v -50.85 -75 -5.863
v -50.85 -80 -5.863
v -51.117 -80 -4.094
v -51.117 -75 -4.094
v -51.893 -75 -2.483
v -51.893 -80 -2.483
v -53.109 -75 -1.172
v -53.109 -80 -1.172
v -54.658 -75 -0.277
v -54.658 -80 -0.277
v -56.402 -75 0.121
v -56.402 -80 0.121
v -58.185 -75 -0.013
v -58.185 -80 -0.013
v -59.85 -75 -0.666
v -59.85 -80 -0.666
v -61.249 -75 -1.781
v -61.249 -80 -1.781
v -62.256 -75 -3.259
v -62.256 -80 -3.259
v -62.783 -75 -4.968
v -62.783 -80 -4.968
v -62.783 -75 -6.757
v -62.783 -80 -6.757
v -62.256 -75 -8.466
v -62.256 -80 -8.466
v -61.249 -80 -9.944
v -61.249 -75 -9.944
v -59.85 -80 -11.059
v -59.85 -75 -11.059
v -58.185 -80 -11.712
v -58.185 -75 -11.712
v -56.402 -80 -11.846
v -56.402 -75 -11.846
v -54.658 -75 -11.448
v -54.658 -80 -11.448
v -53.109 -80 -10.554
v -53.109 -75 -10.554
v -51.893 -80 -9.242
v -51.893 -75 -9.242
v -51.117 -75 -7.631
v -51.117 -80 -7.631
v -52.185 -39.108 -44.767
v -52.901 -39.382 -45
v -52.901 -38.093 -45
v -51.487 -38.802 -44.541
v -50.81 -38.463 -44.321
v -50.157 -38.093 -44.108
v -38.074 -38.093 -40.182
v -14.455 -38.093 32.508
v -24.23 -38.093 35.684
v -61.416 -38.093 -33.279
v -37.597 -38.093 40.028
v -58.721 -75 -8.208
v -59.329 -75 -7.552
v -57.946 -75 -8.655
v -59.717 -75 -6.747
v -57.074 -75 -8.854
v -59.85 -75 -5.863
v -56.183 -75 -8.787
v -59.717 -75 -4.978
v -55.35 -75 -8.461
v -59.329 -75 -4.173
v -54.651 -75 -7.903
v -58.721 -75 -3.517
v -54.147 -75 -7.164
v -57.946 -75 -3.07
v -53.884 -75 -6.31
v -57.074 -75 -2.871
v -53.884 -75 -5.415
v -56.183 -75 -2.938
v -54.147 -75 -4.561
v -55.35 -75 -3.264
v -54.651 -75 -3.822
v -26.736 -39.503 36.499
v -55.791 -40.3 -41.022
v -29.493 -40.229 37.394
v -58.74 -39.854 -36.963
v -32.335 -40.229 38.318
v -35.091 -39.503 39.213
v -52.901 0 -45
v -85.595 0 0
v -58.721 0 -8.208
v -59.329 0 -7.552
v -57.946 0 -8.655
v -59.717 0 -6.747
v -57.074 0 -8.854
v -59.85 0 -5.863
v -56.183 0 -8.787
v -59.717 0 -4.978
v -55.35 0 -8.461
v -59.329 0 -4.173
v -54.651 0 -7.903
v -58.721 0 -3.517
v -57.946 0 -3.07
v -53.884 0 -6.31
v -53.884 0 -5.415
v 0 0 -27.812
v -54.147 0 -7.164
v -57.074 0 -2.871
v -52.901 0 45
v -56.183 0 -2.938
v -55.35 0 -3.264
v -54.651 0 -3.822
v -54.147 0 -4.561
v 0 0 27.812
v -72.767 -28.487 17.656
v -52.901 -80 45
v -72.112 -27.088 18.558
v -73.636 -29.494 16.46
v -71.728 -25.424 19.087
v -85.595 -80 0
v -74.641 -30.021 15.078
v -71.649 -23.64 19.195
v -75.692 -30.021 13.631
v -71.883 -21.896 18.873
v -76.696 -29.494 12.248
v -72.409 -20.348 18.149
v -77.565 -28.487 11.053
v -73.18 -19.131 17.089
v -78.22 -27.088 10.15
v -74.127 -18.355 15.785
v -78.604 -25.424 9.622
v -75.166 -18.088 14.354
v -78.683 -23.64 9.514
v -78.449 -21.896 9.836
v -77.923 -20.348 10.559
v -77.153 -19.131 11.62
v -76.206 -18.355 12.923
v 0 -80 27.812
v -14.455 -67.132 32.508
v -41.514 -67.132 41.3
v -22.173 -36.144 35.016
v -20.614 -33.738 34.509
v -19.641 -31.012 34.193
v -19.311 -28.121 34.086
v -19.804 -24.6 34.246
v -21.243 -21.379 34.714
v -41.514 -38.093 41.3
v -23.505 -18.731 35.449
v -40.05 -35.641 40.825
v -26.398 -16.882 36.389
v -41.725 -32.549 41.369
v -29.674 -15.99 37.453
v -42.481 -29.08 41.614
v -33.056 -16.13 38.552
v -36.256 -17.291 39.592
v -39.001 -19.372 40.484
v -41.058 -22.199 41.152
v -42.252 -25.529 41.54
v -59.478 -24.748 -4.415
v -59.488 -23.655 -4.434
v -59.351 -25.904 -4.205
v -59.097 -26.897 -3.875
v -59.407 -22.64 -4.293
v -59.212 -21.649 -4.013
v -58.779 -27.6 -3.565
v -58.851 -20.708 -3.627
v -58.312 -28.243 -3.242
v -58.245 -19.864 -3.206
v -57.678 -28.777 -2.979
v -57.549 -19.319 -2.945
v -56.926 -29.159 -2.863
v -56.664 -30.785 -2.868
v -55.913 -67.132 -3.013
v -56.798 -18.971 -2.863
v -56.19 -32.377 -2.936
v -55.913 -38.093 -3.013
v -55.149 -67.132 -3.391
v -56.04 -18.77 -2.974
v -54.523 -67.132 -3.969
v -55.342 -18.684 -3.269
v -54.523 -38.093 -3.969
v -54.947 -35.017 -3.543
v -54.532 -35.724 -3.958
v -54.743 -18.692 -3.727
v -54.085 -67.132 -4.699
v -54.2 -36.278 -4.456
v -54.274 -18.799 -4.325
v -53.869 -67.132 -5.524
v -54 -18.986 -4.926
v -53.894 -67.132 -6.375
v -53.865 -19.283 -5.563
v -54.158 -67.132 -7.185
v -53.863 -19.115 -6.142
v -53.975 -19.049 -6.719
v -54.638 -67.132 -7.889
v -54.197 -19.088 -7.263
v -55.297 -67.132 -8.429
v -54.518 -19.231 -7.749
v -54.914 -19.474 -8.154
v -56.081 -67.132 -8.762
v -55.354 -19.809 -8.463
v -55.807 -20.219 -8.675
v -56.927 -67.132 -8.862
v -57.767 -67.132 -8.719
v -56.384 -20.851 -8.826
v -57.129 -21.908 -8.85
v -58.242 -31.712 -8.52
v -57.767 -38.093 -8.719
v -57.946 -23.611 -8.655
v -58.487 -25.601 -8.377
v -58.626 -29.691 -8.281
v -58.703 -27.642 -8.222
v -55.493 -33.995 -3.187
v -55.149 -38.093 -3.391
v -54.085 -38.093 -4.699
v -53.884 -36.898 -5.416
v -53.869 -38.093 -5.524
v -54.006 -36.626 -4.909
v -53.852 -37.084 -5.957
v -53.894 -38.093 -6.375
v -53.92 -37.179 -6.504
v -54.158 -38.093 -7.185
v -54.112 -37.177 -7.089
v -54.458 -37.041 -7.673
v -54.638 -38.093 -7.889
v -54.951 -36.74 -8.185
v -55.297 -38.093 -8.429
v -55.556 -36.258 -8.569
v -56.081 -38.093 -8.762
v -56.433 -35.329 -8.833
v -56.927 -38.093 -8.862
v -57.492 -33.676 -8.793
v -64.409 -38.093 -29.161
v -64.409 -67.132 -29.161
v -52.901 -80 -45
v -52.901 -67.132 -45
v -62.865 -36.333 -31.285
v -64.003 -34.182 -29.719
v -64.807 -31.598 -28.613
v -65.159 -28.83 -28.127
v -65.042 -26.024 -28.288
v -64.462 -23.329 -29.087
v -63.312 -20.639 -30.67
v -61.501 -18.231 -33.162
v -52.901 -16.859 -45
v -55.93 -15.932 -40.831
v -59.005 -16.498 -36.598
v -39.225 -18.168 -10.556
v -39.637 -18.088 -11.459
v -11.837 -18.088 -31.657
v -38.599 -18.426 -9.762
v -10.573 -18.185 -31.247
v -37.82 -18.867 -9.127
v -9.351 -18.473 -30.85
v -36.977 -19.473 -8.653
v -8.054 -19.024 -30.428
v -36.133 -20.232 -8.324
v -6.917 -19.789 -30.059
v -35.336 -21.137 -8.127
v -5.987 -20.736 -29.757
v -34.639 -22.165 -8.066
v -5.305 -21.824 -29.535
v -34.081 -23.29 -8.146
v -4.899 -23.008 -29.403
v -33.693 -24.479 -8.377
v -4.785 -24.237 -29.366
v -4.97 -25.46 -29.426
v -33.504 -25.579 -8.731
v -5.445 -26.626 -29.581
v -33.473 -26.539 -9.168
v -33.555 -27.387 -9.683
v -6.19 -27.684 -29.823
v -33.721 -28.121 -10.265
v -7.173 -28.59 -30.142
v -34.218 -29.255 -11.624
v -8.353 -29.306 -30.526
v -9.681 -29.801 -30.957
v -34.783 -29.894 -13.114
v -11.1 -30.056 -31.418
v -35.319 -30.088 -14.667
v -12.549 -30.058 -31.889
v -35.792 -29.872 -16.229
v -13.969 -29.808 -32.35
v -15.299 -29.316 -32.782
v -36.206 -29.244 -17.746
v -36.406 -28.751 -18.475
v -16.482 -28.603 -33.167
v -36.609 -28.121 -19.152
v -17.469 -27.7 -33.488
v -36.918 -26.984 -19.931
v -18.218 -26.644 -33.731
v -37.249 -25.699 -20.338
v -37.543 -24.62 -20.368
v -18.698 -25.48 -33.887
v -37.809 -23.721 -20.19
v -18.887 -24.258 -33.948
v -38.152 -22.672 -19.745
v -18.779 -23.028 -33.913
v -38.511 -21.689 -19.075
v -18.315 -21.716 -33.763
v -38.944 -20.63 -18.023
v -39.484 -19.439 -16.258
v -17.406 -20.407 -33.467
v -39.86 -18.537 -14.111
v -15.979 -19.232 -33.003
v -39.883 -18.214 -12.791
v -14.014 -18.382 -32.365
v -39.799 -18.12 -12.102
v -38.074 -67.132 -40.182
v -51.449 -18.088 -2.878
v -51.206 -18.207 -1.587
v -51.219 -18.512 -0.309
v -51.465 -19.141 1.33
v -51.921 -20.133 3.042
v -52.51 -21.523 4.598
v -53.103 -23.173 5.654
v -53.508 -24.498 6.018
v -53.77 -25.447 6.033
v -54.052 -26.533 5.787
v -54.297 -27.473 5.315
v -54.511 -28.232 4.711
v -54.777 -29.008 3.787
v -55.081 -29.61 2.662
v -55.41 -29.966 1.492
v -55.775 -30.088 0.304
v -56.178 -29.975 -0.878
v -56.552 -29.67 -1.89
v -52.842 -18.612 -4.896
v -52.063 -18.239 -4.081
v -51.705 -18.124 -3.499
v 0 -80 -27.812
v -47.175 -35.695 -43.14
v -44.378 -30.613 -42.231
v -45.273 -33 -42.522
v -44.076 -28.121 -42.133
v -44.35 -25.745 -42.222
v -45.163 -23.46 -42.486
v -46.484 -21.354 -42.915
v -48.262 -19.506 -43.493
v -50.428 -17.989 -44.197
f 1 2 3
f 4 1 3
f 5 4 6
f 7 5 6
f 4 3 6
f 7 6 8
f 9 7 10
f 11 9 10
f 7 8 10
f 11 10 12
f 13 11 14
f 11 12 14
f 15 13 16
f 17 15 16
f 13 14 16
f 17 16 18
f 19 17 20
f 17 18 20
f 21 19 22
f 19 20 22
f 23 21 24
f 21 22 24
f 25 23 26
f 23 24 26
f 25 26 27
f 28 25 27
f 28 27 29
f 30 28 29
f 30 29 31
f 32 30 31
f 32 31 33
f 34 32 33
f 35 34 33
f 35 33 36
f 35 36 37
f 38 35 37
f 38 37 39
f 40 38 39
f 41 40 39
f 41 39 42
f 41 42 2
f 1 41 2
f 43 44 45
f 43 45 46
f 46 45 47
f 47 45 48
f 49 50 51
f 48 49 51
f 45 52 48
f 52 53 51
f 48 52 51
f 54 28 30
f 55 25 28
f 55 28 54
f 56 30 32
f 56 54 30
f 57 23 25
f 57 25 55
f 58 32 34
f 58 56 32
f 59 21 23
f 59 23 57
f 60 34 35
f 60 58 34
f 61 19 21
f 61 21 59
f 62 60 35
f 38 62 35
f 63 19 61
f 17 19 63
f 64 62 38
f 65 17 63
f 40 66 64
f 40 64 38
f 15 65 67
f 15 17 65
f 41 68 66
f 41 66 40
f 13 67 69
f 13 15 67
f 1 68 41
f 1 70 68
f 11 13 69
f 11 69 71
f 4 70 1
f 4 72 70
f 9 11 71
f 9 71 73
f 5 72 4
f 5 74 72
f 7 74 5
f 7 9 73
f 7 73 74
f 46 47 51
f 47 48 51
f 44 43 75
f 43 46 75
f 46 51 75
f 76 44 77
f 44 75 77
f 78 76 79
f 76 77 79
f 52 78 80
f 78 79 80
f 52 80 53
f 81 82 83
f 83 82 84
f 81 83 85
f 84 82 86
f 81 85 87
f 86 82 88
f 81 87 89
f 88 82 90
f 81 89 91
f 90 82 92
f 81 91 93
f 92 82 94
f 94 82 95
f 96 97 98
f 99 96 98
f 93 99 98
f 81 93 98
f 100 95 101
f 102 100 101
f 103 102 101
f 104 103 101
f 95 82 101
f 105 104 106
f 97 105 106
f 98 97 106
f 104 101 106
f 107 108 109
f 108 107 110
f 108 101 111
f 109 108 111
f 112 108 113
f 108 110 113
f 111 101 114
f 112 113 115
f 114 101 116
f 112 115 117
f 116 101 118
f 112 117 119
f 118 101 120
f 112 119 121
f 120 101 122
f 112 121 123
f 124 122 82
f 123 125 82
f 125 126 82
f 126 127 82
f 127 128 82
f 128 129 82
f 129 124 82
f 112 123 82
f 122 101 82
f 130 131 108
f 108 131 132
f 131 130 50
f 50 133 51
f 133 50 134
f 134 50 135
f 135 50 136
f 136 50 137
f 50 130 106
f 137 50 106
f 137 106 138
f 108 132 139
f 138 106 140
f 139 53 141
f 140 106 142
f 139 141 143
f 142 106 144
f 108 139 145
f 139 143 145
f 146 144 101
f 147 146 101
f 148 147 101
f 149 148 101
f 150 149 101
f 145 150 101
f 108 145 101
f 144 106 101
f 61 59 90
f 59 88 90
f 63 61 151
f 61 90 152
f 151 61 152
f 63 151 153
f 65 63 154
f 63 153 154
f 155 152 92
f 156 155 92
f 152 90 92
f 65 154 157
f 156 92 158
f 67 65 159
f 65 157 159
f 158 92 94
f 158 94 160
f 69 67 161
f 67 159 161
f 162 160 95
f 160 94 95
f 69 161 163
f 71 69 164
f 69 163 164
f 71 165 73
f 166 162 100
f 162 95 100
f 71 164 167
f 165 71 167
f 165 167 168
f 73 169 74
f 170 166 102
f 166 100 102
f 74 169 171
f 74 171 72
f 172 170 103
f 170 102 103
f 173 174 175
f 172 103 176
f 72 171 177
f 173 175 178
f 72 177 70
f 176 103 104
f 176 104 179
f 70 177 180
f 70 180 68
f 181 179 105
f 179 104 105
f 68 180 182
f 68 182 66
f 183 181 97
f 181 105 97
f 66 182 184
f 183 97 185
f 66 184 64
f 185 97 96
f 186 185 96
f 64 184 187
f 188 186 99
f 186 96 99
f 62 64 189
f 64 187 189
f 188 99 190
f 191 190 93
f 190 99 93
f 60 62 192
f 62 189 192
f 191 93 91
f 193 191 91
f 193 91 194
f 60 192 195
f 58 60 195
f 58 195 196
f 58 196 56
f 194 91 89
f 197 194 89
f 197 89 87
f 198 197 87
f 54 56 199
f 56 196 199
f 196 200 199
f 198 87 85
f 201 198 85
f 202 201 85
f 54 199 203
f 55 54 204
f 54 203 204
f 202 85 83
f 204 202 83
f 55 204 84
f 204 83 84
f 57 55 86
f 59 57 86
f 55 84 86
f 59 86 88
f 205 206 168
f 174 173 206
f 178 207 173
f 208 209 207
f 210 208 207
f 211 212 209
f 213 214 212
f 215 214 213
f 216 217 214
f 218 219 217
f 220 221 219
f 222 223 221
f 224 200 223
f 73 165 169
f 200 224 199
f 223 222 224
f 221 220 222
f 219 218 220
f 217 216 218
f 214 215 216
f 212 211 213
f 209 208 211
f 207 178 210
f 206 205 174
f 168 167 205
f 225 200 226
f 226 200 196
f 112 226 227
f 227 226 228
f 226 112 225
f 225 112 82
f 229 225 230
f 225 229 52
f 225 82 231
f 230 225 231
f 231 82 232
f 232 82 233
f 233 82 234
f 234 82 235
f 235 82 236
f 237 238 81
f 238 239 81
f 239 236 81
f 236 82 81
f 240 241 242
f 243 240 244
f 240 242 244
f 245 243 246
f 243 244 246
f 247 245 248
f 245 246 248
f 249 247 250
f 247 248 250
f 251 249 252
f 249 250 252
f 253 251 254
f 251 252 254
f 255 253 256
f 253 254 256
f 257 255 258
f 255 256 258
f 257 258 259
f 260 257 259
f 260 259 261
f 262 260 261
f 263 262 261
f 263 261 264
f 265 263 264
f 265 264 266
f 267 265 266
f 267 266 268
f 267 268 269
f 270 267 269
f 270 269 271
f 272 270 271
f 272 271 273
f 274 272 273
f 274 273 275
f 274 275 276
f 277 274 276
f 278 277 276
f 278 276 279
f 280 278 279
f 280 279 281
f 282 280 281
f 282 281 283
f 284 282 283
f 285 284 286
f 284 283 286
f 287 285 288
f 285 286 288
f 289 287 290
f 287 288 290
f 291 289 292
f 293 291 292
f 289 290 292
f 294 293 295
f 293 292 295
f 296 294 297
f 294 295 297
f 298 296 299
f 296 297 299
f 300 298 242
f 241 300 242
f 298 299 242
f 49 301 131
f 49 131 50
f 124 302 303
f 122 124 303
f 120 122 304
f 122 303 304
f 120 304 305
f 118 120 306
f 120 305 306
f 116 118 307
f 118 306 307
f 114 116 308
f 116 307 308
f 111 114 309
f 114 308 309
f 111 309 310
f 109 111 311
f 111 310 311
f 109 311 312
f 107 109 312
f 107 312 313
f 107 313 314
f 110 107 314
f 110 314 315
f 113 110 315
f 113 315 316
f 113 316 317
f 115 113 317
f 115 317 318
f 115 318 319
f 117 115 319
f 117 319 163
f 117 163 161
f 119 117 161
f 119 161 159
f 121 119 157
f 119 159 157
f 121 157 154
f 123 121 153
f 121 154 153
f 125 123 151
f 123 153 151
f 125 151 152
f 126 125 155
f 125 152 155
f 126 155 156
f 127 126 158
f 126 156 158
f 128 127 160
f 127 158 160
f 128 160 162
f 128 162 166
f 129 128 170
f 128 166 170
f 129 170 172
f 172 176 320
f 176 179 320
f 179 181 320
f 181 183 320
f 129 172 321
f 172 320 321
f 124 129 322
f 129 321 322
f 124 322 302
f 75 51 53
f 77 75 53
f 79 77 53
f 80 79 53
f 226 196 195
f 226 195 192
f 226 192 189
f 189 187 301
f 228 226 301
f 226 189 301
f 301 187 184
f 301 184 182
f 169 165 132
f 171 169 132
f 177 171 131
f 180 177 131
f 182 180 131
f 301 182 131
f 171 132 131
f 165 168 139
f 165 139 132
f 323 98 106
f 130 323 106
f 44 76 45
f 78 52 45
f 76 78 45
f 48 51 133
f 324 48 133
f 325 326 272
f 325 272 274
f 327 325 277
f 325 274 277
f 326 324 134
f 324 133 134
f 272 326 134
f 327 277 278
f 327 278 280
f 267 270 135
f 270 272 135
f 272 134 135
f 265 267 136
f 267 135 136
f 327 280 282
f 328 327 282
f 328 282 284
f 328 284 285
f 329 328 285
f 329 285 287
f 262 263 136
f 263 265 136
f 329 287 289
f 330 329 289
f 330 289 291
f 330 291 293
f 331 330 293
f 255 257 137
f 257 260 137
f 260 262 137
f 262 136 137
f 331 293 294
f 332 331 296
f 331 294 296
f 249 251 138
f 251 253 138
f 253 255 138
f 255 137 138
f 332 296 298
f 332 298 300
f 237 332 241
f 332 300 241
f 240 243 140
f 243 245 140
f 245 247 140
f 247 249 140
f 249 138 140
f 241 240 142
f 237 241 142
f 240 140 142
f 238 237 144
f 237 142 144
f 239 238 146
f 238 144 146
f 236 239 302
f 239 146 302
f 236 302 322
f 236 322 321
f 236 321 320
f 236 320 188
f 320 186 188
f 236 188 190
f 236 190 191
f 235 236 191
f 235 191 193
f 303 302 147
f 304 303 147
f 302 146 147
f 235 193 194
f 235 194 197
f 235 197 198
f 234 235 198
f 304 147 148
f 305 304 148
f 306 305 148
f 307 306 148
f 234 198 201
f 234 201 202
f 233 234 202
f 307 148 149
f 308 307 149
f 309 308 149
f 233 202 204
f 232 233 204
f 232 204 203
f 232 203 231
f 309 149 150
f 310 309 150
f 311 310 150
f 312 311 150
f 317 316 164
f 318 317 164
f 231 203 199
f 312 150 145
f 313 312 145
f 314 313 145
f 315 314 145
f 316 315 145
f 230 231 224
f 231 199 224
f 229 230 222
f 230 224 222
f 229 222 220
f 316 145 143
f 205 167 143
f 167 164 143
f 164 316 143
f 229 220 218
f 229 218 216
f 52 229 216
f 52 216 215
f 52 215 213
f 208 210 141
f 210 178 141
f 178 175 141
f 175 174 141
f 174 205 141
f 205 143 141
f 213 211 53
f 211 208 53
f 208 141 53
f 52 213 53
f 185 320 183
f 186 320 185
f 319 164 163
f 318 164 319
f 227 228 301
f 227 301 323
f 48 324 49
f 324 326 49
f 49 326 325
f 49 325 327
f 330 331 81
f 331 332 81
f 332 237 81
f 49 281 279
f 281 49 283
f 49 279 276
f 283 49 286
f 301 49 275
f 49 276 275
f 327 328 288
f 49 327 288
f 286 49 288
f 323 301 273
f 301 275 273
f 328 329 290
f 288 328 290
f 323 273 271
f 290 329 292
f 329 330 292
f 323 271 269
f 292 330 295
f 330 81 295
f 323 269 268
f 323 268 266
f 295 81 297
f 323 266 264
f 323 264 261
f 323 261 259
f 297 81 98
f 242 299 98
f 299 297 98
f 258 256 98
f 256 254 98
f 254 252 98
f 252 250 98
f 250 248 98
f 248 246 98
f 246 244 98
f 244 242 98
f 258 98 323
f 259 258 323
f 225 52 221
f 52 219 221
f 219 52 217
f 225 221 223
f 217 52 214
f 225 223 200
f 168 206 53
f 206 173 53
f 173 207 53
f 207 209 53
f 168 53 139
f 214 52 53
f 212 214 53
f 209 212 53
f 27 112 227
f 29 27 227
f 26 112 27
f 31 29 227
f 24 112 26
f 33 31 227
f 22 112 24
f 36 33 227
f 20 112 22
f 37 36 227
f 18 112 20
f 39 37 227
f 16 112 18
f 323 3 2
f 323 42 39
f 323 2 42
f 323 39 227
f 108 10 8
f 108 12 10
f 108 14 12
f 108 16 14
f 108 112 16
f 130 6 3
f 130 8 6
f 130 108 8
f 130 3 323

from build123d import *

# Parameters (mm, degrees)
F1_DEPTH       = 80
F3_D           = 6
F3_CBORE_D     = 12
F3_CBORE_DEPTH = 5
F5_D           = 12
F7_DEPTH       = 166.21013


with BuildPart() as f1:
    # F0 (on Front) → F1 (new body)
    with BuildSketch(Plane.XZ):
        Polygon((0, -27.8115294937), (0, 27.8115294937), (-52.9006727063, 45), (-85.5950864666, 0), (-52.9006727063, -45), align=None)
    extrude(amount=F1_DEPTH)

    # F3 (through all)
    with Locations(Plane.XZ.offset(80)):
        with Locations((-56.8502135575, -5.8625130914)):
            CounterBoreHole(F3_D / 2, F3_CBORE_D / 2, F3_CBORE_DEPTH)

    # F5 (through all)
    with Locations(Plane(origin=(-56.0227114099, 0, 40.7028823734), x_dir=(0, -1, 0), z_dir=(-0.8090169944, 0, 0.5877852523))):
        with Locations((24.08846654, -32.5688272715)):
            Hole(F5_D / 2)

    # F6 (on face) → F7 (cut)
    with BuildSketch(Plane(origin=(8.1736034401, 0, 25.1557647469), x_dir=(0.9510565163, 0, -0.3090169944), z_dir=(0.3090169944, 0, 0.9510565163))):
        with BuildLine():
            ThreePointArc((-34.071443869, -38.0934253335), (-30.2688677691, -33.737830155), (-28.8987650684, -28.1205698848))
            ThreePointArc((-28.8987650684, -28.1205698848), (-46.7161306073, -17.2905673169), (-48.126296805, -38.0934253335))
            Line((-48.126296805, -38.0934253335), (-34.071443869, -38.0934253335))
        make_face()
        with BuildLine():
            ThreePointArc((-34.071443869, -38.0934253335), (-41.098870337, -40.3206751534), (-48.126296805, -38.0934253335))
            Line((-48.126296805, -38.0934253335), (-52.2450059652, -38.0934253335))
            Line((-52.2450059652, -38.0934253335), (-52.2450059652, -67.1320259571))
            Line((-52.2450059652, -67.1320259571), (-23.7930361181, -67.1320259571))
            Line((-23.7930361181, -67.1320259571), (-23.7930361181, -38.0934253335))
            Line((-23.7930361181, -38.0934253335), (-34.071443869, -38.0934253335))
        make_face()
    extrude(amount=-F7_DEPTH, mode=Mode.SUBTRACT)


solid = f1.part
